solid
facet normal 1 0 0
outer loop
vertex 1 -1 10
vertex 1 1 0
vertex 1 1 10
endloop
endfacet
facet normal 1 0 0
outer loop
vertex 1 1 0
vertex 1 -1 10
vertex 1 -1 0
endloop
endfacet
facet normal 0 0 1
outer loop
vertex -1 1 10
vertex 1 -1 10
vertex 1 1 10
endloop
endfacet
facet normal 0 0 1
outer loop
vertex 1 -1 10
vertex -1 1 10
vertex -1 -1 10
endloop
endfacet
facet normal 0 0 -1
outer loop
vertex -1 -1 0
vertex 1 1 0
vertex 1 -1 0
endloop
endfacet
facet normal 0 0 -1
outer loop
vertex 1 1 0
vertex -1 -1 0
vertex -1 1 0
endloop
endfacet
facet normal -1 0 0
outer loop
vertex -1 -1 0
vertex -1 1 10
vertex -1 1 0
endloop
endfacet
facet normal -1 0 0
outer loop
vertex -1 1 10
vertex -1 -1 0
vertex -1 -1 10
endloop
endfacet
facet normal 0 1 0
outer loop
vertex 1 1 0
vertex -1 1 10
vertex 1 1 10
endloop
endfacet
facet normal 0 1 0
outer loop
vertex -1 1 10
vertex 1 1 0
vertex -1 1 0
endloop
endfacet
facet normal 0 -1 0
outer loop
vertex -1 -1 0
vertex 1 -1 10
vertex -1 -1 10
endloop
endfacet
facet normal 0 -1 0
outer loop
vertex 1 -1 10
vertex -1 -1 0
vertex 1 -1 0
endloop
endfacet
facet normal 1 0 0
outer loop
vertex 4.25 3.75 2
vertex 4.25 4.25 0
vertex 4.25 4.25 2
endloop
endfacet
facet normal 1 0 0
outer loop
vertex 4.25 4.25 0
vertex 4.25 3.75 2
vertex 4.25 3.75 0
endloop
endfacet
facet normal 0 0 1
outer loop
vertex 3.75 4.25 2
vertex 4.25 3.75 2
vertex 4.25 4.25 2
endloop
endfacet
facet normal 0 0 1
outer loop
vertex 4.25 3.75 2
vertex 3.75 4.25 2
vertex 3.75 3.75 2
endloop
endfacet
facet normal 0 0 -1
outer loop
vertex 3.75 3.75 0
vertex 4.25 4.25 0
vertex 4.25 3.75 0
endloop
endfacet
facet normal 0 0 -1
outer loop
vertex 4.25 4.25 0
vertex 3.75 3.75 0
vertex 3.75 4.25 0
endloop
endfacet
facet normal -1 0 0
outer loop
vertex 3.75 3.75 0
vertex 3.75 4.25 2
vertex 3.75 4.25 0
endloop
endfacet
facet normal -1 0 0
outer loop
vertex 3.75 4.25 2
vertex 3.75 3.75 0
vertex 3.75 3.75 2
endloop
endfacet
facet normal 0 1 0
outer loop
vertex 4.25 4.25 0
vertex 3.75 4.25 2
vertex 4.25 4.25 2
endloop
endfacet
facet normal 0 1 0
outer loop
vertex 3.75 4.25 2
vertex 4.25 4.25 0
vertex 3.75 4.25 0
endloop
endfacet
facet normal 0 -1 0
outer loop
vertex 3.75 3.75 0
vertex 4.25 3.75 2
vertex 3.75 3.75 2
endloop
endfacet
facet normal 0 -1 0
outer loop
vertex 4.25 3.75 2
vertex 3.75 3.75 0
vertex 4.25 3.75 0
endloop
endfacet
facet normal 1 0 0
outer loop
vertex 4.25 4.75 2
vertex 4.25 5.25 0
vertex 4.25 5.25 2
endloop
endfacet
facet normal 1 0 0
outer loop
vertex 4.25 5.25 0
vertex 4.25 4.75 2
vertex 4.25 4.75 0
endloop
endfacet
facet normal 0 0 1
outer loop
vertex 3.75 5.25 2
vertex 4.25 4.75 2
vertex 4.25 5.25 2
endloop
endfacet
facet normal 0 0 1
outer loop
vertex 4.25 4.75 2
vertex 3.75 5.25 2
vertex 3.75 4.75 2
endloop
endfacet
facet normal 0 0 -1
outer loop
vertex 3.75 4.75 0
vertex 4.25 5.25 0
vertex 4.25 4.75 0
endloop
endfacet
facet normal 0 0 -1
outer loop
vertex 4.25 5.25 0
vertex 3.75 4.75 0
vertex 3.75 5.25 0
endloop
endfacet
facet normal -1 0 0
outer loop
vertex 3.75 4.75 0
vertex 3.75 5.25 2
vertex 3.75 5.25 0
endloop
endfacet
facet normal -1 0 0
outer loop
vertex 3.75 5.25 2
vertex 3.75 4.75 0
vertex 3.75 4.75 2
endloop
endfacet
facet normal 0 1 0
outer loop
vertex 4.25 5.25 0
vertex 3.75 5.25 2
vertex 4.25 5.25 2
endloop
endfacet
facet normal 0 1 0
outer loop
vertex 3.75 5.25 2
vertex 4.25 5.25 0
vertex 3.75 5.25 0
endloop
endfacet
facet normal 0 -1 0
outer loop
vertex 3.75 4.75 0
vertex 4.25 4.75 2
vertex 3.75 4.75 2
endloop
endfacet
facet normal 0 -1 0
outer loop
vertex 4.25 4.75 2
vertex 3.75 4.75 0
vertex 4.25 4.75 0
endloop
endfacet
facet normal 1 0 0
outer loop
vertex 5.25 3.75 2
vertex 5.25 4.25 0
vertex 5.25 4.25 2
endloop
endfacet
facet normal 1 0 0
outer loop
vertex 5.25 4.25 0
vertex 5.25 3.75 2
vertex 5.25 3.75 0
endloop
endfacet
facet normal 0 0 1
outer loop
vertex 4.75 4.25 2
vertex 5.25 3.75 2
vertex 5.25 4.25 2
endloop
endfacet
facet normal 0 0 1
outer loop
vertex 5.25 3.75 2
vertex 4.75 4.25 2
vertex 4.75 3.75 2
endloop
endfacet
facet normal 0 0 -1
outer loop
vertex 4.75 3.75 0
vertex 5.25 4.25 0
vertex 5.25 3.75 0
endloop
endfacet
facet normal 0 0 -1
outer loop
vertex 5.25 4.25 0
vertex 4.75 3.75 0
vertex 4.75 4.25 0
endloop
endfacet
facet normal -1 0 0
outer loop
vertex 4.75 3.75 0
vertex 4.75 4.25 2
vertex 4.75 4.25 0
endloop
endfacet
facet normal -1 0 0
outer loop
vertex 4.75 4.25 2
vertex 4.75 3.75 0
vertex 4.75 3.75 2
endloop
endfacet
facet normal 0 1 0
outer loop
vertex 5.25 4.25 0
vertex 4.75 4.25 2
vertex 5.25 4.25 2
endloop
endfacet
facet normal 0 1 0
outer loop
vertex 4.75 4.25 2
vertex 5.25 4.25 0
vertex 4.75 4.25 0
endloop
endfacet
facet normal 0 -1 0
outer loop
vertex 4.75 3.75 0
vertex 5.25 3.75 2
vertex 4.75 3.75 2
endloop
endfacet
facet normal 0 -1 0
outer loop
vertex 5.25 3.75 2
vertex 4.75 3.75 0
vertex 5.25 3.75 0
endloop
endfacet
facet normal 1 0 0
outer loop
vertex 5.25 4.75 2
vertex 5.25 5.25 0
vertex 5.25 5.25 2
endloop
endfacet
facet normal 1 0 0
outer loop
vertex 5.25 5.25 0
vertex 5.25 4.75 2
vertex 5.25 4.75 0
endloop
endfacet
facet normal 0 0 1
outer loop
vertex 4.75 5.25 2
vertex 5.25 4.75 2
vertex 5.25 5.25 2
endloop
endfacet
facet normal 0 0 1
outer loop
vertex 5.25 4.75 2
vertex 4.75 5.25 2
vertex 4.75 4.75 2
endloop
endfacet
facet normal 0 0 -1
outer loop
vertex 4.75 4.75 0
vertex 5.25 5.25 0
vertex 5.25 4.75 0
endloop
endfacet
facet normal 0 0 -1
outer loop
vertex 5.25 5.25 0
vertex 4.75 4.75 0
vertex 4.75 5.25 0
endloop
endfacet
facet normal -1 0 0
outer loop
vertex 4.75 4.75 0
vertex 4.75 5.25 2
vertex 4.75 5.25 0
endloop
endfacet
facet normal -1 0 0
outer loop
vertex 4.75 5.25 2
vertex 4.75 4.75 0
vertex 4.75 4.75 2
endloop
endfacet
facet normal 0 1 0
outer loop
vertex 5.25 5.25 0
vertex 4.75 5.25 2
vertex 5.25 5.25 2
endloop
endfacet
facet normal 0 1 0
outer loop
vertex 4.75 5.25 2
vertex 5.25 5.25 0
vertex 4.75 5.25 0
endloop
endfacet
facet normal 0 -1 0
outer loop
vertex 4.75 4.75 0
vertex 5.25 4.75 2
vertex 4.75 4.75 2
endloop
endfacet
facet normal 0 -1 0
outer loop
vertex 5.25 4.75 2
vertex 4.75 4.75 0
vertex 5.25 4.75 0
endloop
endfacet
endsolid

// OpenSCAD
translate([0, 0, 5]) color([0,1,0,0.9]) cube([2, 2, 10], center=true);
translate([4.0, 4.0, 1]) color([1,0,0]) cube([0.5, 0.5, 2], center=true);
translate([4.0, 5.0, 1]) color([1,0,0]) cube([0.5, 0.5, 2], center=true);
translate([5.0, 4.0, 1]) color([1,0,0]) cube([0.5, 0.5, 2], center=true);
translate([5.0, 5.0, 1]) color([1,0,0]) cube([0.5, 0.5, 2], center=true);
